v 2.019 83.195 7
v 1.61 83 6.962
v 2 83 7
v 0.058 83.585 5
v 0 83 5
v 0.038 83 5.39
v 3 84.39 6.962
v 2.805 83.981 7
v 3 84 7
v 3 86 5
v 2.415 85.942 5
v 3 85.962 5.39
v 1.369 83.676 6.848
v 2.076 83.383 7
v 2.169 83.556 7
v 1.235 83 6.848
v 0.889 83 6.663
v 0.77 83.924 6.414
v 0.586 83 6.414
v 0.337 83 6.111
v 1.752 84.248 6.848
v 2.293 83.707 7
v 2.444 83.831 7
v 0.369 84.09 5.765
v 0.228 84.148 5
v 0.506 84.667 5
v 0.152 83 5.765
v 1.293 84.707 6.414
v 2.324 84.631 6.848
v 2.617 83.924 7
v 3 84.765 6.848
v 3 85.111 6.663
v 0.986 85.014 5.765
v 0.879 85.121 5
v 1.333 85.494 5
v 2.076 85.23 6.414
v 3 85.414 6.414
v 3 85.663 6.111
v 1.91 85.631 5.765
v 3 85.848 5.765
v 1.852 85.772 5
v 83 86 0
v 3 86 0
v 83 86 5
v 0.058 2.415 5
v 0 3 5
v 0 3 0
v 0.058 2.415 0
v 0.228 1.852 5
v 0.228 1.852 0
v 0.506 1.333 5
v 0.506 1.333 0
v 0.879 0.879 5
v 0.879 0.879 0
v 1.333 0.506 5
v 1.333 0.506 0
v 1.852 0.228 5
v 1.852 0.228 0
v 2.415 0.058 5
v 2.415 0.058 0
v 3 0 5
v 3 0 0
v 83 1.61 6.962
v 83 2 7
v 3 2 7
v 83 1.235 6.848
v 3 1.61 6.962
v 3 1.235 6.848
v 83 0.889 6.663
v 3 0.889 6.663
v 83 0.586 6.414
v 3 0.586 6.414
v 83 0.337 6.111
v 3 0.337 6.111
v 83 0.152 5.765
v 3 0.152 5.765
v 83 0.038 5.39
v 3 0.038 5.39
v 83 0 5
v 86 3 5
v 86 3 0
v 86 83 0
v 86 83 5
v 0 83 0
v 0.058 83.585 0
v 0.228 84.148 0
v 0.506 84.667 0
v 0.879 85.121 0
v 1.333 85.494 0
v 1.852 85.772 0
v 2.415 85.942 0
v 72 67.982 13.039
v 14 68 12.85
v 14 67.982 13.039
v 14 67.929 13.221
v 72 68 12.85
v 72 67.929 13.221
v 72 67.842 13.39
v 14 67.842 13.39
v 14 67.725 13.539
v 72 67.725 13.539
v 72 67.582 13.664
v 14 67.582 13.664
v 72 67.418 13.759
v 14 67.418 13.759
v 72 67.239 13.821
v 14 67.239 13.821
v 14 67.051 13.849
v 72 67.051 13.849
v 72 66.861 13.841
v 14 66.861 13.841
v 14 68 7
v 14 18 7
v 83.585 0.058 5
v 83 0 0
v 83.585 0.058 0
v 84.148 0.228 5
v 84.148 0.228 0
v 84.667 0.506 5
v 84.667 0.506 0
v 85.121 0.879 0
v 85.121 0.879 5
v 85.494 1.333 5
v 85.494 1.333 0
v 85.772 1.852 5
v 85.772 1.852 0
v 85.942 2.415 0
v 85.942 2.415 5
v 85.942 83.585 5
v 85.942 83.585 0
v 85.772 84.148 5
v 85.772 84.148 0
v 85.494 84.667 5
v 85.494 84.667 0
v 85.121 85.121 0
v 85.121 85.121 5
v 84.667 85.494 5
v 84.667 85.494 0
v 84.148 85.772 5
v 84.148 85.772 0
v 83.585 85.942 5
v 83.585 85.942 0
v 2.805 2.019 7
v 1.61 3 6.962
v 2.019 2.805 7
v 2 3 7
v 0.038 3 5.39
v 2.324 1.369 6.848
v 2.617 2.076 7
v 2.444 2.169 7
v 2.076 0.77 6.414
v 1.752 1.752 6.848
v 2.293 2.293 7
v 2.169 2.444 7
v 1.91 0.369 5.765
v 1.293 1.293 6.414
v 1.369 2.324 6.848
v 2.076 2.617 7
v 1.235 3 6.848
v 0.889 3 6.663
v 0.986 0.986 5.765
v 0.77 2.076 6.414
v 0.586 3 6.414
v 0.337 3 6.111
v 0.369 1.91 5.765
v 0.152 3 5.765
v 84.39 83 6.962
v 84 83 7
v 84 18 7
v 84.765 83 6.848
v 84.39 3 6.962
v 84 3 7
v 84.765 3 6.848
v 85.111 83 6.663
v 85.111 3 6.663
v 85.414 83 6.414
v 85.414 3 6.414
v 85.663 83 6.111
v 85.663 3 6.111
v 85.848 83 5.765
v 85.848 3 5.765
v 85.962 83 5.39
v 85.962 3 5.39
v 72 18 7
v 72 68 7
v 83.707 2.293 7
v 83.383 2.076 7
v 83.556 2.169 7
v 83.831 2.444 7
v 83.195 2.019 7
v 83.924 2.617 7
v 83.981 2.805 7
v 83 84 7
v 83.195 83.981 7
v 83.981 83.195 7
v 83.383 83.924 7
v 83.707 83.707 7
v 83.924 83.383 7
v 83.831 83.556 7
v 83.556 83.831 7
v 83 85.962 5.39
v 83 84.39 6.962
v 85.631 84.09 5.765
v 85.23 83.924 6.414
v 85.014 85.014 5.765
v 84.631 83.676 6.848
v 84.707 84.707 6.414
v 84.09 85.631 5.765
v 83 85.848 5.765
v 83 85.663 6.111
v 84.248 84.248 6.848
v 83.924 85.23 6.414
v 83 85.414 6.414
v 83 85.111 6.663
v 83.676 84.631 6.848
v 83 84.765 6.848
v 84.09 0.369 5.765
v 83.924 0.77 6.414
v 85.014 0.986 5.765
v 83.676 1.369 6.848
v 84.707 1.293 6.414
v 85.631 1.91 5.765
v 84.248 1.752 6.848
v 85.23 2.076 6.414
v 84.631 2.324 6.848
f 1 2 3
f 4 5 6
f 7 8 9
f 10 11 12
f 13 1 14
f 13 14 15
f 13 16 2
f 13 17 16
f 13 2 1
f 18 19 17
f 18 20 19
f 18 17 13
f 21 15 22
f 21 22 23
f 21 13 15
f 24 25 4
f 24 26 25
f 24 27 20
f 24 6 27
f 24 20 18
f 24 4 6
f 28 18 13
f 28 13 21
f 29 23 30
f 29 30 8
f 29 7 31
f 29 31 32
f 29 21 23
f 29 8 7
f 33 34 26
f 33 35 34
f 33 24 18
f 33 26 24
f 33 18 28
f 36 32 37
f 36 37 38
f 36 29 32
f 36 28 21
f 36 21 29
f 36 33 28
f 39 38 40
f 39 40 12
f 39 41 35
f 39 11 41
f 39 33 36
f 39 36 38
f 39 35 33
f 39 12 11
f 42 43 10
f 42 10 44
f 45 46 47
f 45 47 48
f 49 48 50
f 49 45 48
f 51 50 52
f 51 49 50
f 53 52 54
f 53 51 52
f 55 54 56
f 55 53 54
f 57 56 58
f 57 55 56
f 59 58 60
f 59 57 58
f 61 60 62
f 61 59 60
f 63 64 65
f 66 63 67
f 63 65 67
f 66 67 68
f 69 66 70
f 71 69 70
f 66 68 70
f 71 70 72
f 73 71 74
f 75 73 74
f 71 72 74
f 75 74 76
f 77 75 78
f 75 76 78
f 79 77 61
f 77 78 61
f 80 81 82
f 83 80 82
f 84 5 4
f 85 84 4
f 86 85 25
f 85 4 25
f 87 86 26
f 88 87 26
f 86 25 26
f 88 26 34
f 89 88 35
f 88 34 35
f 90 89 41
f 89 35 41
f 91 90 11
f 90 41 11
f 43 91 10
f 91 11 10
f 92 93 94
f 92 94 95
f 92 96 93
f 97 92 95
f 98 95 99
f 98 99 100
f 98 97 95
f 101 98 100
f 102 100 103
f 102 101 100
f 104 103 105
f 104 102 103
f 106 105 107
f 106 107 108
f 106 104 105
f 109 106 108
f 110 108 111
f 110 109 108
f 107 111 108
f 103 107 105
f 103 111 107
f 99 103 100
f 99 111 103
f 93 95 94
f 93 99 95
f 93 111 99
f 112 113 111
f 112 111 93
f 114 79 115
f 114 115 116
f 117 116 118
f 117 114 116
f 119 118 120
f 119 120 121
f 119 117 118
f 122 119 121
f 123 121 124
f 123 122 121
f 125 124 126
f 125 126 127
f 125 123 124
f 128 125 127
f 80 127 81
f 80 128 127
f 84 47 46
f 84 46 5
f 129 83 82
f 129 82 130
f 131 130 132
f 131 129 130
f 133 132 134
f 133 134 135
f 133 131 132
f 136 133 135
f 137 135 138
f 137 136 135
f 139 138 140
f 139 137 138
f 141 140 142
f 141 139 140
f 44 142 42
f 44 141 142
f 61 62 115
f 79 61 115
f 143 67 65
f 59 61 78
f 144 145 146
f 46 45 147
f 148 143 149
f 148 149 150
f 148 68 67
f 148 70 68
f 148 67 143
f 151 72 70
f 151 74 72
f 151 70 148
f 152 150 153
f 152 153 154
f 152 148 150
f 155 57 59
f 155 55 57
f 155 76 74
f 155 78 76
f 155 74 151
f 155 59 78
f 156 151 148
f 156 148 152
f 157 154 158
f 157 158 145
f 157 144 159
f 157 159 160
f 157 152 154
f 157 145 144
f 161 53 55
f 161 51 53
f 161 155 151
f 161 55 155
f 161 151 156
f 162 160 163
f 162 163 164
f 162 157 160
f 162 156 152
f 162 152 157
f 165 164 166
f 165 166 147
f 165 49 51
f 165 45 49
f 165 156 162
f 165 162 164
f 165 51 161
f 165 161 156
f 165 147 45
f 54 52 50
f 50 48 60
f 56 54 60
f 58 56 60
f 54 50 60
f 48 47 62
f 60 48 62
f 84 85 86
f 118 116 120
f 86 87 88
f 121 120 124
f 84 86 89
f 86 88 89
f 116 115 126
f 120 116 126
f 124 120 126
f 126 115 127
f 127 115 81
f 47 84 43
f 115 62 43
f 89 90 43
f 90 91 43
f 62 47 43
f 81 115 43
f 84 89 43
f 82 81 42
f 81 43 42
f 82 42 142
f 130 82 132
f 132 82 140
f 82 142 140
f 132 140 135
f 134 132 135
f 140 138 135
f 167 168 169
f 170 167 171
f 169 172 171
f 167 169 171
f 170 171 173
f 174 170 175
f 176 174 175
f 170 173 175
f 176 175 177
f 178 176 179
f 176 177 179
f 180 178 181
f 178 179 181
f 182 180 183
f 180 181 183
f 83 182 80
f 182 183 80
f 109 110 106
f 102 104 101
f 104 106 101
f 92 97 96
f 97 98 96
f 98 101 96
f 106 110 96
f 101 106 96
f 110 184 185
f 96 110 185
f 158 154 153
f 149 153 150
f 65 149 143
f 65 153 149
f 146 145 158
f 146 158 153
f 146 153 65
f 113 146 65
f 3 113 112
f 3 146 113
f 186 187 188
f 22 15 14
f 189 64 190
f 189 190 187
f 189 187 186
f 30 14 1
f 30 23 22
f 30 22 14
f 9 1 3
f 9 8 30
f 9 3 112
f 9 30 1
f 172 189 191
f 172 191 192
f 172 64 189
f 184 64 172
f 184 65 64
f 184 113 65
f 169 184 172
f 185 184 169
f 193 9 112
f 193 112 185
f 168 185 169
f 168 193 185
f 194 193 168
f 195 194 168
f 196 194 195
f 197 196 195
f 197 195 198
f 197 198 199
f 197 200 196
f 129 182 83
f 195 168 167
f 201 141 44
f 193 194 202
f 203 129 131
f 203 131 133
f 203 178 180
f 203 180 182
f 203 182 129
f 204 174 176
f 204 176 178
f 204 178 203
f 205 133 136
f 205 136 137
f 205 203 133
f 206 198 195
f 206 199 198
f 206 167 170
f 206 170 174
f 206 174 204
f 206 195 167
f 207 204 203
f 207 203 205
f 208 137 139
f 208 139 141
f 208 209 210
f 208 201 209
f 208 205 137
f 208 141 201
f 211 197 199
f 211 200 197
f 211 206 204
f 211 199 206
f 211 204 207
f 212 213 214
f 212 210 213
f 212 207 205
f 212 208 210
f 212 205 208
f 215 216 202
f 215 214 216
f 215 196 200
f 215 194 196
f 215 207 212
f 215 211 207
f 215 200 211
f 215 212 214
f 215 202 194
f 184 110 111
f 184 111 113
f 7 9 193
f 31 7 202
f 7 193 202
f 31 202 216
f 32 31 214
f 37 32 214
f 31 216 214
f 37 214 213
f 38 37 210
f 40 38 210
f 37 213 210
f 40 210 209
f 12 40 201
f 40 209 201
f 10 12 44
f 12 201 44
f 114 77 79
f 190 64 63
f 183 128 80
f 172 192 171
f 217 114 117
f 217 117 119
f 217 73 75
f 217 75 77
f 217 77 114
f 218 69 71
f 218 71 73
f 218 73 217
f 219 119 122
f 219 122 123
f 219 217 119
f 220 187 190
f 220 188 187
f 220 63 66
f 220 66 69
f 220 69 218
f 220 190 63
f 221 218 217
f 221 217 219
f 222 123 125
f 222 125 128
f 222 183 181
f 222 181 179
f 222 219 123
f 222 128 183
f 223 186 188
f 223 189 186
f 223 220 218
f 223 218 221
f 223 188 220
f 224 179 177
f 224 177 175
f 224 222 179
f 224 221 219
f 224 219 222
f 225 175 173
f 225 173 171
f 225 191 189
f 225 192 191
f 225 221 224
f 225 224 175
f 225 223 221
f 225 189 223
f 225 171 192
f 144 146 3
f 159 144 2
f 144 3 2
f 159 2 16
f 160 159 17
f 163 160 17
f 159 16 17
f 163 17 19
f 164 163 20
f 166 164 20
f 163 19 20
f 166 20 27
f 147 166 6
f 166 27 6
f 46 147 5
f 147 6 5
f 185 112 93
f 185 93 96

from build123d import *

# Parameters (mm, degrees)
SKETCH_1_W          = 86
SKETCH_1_H          = 86
SKETCH_1_W_2        = 58
SKETCH_1_H_2        = 50
EXTRUDE_1_DEPTH     = 7
SKETCH_1_5_W        = 58
SKETCH_1_5_H        = 50
EXTRUDE_3_DEPTH     = 14
CUT_EXTRUDE_1_DEPTH = 114.030969208
FILLET_1_R          = 3
FILLET_2_R          = 1
FILLET_3_R          = 2


with BuildPart() as part:
    # 草图1 → 凸台-拉伸1 (new body)
    # profile 1 of 2: a face of its own
    with BuildSketch(Plane.XY):
        with Locations((43, 43)):
            Rectangle(SKETCH_1_W, SKETCH_1_H)
        with Locations((43, 43)):
            Rectangle(SKETCH_1_W_2, SKETCH_1_H_2, mode=Mode.SUBTRACT)
    # profile 2 of 2: a face of its own
    with BuildSketch(Plane.XY):
        with Locations((43, 43)):
            Rectangle(SKETCH_1_W_2, SKETCH_1_H_2)
    extrude(amount=EXTRUDE_1_DEPTH)

    # 草图1<5> → 凸台-拉伸3 (add)
    with BuildSketch(Plane.XY):
        with Locations((43, 43)):
            Rectangle(SKETCH_1_5_W, SKETCH_1_5_H)
    extrude(amount=EXTRUDE_3_DEPTH)

    # 草图2 → 切除-拉伸1 (cut, through all)
    with BuildSketch(Plane.ZY.offset(-14)):
        Polygon((14, 68), (7, 18), (14, 18), align=None)
    extrude(amount=-CUT_EXTRUDE_1_DEPTH, mode=Mode.SUBTRACT)

    # 圆角1
    fillet_1_edges = [part.edges().sort_by_distance(p)[0] for p in [
        (0, 0, 3.5),
        (0, 86, 3.5),
        (86, 86, 3.5),
        (86, 0, 3.5),
    ]]
    fillet(fillet_1_edges, radius=FILLET_1_R)

    # 圆角2
    fillet_2_edges = [part.edges().sort_by_distance(p)[0] for p in [
        (43, 68, 14),
    ]]
    fillet(fillet_2_edges, radius=FILLET_2_R)

    # 圆角3
    # the kernel refuses this fillet: 2 mm, written as the material it takes off along each edge
    with BuildSketch(Plane(origin=(83, 86, 7), x_dir=(0, -1, 0), z_dir=(-1, 0, 0)), Plane(origin=(3, 0, 7), x_dir=(0, 1, 0), z_dir=(1, 0, 0)), Plane(origin=(0, 83, 7), x_dir=(1, 0, 0), z_dir=(0, -1, 0))) as fillet_3_piece_1:
        with BuildLine():
            CenterArc((FILLET_3_R, -FILLET_3_R), FILLET_3_R, 90, 90)
            Line((0, -FILLET_3_R), (0, 0))
            Line((0, 0), (FILLET_3_R, 0))
        make_face()
    extrude(amount=80, mode=Mode.SUBTRACT)
    with BuildSketch(Plane(origin=(86, 18, 7), x_dir=(-1, 0, 0), z_dir=(0, 1, 0))) as fillet_3_piece_2:
        with BuildLine():
            CenterArc((FILLET_3_R, -FILLET_3_R), FILLET_3_R, 90, 90)
            Line((0, -FILLET_3_R), (0, 0))
            Line((0, 0), (FILLET_3_R, 0))
        make_face()
    extrude(amount=65, mode=Mode.SUBTRACT)
    with BuildSketch(Plane(origin=(3, 83, 7), x_dir=(-1, 0, 0), z_dir=(0, -1, 0))) as fillet_3_piece_3:
        with BuildLine():
            CenterArc((3 - FILLET_3_R, FILLET_3_R), FILLET_3_R, 270, 90)
            Line((3, FILLET_3_R), (3, 0))
            Line((3, 0), (3 - FILLET_3_R, 0))
        make_face()
    revolve(axis=Axis((3, 83, 7), (0, 0, -1)), revolution_arc=90, mode=Mode.SUBTRACT)
    with BuildSketch(Plane(origin=(3, 3, 7), x_dir=(0, -1, 0), z_dir=(1, 0, 0))) as fillet_3_piece_4:
        with BuildLine():
            CenterArc((3 - FILLET_3_R, FILLET_3_R), FILLET_3_R, 270, 90)
            Line((3, FILLET_3_R), (3, 0))
            Line((3, 0), (3 - FILLET_3_R, 0))
        make_face()
    revolve(axis=Axis((3, 3, 7), (0, 0, -1)), revolution_arc=90, mode=Mode.SUBTRACT)
    with BuildSketch(Plane(origin=(83, 3, 7), x_dir=(0, -1, 0), z_dir=(-1, 0, 0))) as fillet_3_piece_5:
        with BuildLine():
            CenterArc((3 - FILLET_3_R, -FILLET_3_R), FILLET_3_R, 0, 90)
            Line((3, -FILLET_3_R), (3, 0))
            Line((3, 0), (3 - FILLET_3_R, 0))
        make_face()
    revolve(axis=Axis((83, 3, 7), (0, 0, 1)), revolution_arc=90, mode=Mode.SUBTRACT)
    with BuildSketch(Plane(origin=(83, 83, 7), x_dir=(1, 0, 0), z_dir=(0, -1, 0))) as fillet_3_piece_6:
        with BuildLine():
            CenterArc((3 - FILLET_3_R, -FILLET_3_R), FILLET_3_R, 0, 90)
            Line((3, -FILLET_3_R), (3, 0))
            Line((3, 0), (3 - FILLET_3_R, 0))
        make_face()
    revolve(axis=Axis((83, 83, 7), (0, 0, 1)), revolution_arc=90, mode=Mode.SUBTRACT)
    with BuildSketch(Plane(origin=(86, 3, 7), x_dir=(-1, 0, 0), z_dir=(0, 1, 0))) as fillet_3_piece_7:
        with BuildLine():
            CenterArc((FILLET_3_R, -FILLET_3_R), FILLET_3_R, 90, 90)
            Line((0, -FILLET_3_R), (0, 0))
            Line((0, 0), (FILLET_3_R, 0))
        make_face()
    extrude(amount=15, mode=Mode.SUBTRACT)


solid = part.part
